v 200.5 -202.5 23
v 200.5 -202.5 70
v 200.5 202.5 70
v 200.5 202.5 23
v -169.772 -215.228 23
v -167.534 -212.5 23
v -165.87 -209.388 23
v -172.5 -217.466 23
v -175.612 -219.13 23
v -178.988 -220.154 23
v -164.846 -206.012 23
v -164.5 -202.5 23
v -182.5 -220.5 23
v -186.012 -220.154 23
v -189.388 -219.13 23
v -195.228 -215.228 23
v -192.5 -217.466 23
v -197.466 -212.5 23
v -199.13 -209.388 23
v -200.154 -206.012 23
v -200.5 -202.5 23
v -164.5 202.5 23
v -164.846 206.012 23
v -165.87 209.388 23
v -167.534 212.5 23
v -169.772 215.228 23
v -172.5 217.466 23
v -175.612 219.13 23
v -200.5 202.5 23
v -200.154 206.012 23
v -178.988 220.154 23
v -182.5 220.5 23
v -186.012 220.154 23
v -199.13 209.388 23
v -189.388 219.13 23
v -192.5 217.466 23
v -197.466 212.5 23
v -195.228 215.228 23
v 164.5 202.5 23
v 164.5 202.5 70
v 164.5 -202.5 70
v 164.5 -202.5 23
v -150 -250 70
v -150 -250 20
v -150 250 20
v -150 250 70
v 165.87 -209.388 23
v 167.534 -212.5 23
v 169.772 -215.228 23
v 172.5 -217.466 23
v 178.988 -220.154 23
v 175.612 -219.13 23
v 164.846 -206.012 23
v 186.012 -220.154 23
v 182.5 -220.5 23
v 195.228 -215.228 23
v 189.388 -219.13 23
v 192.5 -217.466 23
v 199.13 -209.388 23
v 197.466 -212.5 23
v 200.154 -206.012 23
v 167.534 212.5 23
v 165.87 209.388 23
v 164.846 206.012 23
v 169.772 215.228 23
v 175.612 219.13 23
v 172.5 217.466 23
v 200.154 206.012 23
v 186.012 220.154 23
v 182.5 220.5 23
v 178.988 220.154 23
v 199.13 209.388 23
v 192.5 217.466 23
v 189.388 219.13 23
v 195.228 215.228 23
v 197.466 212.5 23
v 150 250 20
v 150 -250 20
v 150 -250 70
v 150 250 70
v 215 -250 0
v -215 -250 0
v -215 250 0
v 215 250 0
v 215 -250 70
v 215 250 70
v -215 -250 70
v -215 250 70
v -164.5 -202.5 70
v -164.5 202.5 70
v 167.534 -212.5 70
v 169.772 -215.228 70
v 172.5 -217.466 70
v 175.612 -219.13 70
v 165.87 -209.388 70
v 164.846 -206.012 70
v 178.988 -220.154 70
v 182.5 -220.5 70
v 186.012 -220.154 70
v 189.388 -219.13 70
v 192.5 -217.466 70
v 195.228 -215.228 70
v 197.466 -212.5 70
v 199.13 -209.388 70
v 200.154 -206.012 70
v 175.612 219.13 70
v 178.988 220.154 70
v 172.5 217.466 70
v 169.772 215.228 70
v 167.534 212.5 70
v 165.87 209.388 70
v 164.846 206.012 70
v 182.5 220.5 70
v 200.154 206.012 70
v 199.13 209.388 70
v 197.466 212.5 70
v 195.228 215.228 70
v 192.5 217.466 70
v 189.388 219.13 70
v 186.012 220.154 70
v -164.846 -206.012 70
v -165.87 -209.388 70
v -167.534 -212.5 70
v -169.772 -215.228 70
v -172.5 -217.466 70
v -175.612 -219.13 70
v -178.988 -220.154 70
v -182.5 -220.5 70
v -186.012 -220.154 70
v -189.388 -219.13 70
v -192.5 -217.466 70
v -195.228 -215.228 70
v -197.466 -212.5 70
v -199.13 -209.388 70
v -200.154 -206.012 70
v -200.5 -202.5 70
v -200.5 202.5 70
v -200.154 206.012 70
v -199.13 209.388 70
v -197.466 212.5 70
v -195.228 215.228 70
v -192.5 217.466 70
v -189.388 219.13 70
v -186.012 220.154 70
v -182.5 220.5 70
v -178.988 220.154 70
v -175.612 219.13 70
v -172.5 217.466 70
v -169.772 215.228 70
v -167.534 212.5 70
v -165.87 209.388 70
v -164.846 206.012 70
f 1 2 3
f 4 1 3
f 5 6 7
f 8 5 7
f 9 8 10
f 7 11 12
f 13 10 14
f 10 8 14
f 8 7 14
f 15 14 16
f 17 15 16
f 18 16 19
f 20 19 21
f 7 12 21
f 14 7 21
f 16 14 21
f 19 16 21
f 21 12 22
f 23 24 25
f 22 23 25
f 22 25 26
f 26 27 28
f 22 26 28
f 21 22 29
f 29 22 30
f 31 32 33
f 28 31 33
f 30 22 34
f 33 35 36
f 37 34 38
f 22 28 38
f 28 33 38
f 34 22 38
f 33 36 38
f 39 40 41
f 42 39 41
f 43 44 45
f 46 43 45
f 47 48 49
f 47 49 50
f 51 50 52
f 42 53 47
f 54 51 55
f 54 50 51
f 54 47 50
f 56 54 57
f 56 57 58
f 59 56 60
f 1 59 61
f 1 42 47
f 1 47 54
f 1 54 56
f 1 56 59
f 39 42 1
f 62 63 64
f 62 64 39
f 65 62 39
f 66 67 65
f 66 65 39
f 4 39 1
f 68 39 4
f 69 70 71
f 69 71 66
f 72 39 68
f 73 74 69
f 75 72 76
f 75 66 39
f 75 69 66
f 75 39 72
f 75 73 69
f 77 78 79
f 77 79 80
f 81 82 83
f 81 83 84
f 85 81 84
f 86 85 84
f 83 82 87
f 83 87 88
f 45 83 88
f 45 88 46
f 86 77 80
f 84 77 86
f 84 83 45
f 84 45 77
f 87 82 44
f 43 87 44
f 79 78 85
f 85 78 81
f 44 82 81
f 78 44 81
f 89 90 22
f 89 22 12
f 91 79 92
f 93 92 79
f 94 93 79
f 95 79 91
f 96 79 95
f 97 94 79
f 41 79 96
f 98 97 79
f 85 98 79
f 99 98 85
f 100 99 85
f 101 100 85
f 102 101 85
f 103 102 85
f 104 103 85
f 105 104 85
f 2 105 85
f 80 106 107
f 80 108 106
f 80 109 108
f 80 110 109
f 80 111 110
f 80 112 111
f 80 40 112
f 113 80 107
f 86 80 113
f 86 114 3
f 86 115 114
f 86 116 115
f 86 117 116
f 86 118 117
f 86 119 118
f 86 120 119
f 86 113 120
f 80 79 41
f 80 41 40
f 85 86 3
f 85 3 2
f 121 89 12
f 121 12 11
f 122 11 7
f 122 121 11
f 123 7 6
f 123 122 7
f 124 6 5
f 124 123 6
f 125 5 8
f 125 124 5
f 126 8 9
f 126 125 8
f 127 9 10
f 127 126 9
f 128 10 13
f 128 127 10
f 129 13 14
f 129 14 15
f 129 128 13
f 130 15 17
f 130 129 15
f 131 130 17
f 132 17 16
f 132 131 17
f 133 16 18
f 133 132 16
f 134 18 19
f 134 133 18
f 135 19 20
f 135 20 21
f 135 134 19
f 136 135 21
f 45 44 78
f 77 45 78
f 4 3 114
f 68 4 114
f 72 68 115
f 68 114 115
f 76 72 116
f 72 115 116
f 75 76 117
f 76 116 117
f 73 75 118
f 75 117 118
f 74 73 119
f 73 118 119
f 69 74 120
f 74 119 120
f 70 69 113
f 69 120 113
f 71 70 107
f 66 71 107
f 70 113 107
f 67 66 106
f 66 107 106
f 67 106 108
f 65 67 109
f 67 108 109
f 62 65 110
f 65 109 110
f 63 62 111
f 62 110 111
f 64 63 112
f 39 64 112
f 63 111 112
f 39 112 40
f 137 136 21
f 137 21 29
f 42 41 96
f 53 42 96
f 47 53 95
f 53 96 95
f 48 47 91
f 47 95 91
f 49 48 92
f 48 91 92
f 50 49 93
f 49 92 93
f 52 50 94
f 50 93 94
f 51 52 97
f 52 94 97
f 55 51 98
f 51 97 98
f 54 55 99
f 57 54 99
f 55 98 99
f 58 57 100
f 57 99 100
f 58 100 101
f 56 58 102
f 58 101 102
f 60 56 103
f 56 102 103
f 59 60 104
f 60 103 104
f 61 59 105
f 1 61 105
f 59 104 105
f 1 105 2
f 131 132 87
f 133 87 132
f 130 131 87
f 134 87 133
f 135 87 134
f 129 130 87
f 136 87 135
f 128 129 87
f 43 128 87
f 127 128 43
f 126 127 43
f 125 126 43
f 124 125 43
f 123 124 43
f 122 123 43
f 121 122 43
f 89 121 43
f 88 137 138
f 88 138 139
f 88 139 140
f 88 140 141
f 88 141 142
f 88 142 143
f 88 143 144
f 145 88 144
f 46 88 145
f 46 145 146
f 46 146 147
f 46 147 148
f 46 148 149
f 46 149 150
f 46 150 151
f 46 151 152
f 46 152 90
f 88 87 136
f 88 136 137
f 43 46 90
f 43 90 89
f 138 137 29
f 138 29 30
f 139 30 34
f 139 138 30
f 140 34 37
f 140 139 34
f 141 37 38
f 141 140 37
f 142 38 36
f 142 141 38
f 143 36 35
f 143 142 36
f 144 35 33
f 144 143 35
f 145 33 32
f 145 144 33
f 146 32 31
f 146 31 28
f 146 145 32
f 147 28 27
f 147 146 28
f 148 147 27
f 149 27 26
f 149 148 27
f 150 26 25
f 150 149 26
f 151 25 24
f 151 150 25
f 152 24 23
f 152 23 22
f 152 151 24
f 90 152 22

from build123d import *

# Parameters (mm, degrees)
SKETCH1_W           = 300
SKETCH1_H           = 500
BOSS_EXTRUDE1_DEPTH = 20
SKETCH1_3_W         = 65
SKETCH1_3_H         = 500
BOSS_EXTRUDE2_DEPTH = 70
CUT_EXTRUDE1_START  = 70
CUT_EXTRUDE1_DEPTH  = 47


with BuildPart() as part:
    # Sketch1 → Boss-Extrude1 (new body)
    with BuildSketch(Plane.XY):
        Rectangle(SKETCH1_W, SKETCH1_H)
    extrude(amount=BOSS_EXTRUDE1_DEPTH)

    # Sketch1<3> → Boss-Extrude2 (add)
    with BuildSketch(Plane.XY):
        with Locations((182.5, 0)):
            Rectangle(SKETCH1_3_W, SKETCH1_3_H)
        with Locations((-182.5, 0)):
            Rectangle(SKETCH1_3_W, SKETCH1_3_H)
    extrude(amount=BOSS_EXTRUDE2_DEPTH)

    # Sketch1<5> → Cut-Extrude1 (cut)
    with BuildSketch(Plane.XY.offset(CUT_EXTRUDE1_START)):
        with BuildLine():
            Line((-164.5, 202.5), (-164.5, -202.5))
            ThreePointArc((-164.5, -202.5), (-182.5, -220.5), (-200.5, -202.5))
            Line((-200.5, -202.5), (-200.5, 202.5))
            ThreePointArc((-200.5, 202.5), (-182.5, 220.5), (-164.5, 202.5))
        make_face()
        with BuildLine():
            Line((164.5, 202.5), (164.5, -202.5))
            ThreePointArc((164.5, -202.5), (182.5, -220.5), (200.5, -202.5))
            Line((200.5, -202.5), (200.5, 202.5))
            ThreePointArc((200.5, 202.5), (182.5, 220.5), (164.5, 202.5))
        make_face()
    extrude(amount=-CUT_EXTRUDE1_DEPTH, mode=Mode.SUBTRACT)


solid = part.part
